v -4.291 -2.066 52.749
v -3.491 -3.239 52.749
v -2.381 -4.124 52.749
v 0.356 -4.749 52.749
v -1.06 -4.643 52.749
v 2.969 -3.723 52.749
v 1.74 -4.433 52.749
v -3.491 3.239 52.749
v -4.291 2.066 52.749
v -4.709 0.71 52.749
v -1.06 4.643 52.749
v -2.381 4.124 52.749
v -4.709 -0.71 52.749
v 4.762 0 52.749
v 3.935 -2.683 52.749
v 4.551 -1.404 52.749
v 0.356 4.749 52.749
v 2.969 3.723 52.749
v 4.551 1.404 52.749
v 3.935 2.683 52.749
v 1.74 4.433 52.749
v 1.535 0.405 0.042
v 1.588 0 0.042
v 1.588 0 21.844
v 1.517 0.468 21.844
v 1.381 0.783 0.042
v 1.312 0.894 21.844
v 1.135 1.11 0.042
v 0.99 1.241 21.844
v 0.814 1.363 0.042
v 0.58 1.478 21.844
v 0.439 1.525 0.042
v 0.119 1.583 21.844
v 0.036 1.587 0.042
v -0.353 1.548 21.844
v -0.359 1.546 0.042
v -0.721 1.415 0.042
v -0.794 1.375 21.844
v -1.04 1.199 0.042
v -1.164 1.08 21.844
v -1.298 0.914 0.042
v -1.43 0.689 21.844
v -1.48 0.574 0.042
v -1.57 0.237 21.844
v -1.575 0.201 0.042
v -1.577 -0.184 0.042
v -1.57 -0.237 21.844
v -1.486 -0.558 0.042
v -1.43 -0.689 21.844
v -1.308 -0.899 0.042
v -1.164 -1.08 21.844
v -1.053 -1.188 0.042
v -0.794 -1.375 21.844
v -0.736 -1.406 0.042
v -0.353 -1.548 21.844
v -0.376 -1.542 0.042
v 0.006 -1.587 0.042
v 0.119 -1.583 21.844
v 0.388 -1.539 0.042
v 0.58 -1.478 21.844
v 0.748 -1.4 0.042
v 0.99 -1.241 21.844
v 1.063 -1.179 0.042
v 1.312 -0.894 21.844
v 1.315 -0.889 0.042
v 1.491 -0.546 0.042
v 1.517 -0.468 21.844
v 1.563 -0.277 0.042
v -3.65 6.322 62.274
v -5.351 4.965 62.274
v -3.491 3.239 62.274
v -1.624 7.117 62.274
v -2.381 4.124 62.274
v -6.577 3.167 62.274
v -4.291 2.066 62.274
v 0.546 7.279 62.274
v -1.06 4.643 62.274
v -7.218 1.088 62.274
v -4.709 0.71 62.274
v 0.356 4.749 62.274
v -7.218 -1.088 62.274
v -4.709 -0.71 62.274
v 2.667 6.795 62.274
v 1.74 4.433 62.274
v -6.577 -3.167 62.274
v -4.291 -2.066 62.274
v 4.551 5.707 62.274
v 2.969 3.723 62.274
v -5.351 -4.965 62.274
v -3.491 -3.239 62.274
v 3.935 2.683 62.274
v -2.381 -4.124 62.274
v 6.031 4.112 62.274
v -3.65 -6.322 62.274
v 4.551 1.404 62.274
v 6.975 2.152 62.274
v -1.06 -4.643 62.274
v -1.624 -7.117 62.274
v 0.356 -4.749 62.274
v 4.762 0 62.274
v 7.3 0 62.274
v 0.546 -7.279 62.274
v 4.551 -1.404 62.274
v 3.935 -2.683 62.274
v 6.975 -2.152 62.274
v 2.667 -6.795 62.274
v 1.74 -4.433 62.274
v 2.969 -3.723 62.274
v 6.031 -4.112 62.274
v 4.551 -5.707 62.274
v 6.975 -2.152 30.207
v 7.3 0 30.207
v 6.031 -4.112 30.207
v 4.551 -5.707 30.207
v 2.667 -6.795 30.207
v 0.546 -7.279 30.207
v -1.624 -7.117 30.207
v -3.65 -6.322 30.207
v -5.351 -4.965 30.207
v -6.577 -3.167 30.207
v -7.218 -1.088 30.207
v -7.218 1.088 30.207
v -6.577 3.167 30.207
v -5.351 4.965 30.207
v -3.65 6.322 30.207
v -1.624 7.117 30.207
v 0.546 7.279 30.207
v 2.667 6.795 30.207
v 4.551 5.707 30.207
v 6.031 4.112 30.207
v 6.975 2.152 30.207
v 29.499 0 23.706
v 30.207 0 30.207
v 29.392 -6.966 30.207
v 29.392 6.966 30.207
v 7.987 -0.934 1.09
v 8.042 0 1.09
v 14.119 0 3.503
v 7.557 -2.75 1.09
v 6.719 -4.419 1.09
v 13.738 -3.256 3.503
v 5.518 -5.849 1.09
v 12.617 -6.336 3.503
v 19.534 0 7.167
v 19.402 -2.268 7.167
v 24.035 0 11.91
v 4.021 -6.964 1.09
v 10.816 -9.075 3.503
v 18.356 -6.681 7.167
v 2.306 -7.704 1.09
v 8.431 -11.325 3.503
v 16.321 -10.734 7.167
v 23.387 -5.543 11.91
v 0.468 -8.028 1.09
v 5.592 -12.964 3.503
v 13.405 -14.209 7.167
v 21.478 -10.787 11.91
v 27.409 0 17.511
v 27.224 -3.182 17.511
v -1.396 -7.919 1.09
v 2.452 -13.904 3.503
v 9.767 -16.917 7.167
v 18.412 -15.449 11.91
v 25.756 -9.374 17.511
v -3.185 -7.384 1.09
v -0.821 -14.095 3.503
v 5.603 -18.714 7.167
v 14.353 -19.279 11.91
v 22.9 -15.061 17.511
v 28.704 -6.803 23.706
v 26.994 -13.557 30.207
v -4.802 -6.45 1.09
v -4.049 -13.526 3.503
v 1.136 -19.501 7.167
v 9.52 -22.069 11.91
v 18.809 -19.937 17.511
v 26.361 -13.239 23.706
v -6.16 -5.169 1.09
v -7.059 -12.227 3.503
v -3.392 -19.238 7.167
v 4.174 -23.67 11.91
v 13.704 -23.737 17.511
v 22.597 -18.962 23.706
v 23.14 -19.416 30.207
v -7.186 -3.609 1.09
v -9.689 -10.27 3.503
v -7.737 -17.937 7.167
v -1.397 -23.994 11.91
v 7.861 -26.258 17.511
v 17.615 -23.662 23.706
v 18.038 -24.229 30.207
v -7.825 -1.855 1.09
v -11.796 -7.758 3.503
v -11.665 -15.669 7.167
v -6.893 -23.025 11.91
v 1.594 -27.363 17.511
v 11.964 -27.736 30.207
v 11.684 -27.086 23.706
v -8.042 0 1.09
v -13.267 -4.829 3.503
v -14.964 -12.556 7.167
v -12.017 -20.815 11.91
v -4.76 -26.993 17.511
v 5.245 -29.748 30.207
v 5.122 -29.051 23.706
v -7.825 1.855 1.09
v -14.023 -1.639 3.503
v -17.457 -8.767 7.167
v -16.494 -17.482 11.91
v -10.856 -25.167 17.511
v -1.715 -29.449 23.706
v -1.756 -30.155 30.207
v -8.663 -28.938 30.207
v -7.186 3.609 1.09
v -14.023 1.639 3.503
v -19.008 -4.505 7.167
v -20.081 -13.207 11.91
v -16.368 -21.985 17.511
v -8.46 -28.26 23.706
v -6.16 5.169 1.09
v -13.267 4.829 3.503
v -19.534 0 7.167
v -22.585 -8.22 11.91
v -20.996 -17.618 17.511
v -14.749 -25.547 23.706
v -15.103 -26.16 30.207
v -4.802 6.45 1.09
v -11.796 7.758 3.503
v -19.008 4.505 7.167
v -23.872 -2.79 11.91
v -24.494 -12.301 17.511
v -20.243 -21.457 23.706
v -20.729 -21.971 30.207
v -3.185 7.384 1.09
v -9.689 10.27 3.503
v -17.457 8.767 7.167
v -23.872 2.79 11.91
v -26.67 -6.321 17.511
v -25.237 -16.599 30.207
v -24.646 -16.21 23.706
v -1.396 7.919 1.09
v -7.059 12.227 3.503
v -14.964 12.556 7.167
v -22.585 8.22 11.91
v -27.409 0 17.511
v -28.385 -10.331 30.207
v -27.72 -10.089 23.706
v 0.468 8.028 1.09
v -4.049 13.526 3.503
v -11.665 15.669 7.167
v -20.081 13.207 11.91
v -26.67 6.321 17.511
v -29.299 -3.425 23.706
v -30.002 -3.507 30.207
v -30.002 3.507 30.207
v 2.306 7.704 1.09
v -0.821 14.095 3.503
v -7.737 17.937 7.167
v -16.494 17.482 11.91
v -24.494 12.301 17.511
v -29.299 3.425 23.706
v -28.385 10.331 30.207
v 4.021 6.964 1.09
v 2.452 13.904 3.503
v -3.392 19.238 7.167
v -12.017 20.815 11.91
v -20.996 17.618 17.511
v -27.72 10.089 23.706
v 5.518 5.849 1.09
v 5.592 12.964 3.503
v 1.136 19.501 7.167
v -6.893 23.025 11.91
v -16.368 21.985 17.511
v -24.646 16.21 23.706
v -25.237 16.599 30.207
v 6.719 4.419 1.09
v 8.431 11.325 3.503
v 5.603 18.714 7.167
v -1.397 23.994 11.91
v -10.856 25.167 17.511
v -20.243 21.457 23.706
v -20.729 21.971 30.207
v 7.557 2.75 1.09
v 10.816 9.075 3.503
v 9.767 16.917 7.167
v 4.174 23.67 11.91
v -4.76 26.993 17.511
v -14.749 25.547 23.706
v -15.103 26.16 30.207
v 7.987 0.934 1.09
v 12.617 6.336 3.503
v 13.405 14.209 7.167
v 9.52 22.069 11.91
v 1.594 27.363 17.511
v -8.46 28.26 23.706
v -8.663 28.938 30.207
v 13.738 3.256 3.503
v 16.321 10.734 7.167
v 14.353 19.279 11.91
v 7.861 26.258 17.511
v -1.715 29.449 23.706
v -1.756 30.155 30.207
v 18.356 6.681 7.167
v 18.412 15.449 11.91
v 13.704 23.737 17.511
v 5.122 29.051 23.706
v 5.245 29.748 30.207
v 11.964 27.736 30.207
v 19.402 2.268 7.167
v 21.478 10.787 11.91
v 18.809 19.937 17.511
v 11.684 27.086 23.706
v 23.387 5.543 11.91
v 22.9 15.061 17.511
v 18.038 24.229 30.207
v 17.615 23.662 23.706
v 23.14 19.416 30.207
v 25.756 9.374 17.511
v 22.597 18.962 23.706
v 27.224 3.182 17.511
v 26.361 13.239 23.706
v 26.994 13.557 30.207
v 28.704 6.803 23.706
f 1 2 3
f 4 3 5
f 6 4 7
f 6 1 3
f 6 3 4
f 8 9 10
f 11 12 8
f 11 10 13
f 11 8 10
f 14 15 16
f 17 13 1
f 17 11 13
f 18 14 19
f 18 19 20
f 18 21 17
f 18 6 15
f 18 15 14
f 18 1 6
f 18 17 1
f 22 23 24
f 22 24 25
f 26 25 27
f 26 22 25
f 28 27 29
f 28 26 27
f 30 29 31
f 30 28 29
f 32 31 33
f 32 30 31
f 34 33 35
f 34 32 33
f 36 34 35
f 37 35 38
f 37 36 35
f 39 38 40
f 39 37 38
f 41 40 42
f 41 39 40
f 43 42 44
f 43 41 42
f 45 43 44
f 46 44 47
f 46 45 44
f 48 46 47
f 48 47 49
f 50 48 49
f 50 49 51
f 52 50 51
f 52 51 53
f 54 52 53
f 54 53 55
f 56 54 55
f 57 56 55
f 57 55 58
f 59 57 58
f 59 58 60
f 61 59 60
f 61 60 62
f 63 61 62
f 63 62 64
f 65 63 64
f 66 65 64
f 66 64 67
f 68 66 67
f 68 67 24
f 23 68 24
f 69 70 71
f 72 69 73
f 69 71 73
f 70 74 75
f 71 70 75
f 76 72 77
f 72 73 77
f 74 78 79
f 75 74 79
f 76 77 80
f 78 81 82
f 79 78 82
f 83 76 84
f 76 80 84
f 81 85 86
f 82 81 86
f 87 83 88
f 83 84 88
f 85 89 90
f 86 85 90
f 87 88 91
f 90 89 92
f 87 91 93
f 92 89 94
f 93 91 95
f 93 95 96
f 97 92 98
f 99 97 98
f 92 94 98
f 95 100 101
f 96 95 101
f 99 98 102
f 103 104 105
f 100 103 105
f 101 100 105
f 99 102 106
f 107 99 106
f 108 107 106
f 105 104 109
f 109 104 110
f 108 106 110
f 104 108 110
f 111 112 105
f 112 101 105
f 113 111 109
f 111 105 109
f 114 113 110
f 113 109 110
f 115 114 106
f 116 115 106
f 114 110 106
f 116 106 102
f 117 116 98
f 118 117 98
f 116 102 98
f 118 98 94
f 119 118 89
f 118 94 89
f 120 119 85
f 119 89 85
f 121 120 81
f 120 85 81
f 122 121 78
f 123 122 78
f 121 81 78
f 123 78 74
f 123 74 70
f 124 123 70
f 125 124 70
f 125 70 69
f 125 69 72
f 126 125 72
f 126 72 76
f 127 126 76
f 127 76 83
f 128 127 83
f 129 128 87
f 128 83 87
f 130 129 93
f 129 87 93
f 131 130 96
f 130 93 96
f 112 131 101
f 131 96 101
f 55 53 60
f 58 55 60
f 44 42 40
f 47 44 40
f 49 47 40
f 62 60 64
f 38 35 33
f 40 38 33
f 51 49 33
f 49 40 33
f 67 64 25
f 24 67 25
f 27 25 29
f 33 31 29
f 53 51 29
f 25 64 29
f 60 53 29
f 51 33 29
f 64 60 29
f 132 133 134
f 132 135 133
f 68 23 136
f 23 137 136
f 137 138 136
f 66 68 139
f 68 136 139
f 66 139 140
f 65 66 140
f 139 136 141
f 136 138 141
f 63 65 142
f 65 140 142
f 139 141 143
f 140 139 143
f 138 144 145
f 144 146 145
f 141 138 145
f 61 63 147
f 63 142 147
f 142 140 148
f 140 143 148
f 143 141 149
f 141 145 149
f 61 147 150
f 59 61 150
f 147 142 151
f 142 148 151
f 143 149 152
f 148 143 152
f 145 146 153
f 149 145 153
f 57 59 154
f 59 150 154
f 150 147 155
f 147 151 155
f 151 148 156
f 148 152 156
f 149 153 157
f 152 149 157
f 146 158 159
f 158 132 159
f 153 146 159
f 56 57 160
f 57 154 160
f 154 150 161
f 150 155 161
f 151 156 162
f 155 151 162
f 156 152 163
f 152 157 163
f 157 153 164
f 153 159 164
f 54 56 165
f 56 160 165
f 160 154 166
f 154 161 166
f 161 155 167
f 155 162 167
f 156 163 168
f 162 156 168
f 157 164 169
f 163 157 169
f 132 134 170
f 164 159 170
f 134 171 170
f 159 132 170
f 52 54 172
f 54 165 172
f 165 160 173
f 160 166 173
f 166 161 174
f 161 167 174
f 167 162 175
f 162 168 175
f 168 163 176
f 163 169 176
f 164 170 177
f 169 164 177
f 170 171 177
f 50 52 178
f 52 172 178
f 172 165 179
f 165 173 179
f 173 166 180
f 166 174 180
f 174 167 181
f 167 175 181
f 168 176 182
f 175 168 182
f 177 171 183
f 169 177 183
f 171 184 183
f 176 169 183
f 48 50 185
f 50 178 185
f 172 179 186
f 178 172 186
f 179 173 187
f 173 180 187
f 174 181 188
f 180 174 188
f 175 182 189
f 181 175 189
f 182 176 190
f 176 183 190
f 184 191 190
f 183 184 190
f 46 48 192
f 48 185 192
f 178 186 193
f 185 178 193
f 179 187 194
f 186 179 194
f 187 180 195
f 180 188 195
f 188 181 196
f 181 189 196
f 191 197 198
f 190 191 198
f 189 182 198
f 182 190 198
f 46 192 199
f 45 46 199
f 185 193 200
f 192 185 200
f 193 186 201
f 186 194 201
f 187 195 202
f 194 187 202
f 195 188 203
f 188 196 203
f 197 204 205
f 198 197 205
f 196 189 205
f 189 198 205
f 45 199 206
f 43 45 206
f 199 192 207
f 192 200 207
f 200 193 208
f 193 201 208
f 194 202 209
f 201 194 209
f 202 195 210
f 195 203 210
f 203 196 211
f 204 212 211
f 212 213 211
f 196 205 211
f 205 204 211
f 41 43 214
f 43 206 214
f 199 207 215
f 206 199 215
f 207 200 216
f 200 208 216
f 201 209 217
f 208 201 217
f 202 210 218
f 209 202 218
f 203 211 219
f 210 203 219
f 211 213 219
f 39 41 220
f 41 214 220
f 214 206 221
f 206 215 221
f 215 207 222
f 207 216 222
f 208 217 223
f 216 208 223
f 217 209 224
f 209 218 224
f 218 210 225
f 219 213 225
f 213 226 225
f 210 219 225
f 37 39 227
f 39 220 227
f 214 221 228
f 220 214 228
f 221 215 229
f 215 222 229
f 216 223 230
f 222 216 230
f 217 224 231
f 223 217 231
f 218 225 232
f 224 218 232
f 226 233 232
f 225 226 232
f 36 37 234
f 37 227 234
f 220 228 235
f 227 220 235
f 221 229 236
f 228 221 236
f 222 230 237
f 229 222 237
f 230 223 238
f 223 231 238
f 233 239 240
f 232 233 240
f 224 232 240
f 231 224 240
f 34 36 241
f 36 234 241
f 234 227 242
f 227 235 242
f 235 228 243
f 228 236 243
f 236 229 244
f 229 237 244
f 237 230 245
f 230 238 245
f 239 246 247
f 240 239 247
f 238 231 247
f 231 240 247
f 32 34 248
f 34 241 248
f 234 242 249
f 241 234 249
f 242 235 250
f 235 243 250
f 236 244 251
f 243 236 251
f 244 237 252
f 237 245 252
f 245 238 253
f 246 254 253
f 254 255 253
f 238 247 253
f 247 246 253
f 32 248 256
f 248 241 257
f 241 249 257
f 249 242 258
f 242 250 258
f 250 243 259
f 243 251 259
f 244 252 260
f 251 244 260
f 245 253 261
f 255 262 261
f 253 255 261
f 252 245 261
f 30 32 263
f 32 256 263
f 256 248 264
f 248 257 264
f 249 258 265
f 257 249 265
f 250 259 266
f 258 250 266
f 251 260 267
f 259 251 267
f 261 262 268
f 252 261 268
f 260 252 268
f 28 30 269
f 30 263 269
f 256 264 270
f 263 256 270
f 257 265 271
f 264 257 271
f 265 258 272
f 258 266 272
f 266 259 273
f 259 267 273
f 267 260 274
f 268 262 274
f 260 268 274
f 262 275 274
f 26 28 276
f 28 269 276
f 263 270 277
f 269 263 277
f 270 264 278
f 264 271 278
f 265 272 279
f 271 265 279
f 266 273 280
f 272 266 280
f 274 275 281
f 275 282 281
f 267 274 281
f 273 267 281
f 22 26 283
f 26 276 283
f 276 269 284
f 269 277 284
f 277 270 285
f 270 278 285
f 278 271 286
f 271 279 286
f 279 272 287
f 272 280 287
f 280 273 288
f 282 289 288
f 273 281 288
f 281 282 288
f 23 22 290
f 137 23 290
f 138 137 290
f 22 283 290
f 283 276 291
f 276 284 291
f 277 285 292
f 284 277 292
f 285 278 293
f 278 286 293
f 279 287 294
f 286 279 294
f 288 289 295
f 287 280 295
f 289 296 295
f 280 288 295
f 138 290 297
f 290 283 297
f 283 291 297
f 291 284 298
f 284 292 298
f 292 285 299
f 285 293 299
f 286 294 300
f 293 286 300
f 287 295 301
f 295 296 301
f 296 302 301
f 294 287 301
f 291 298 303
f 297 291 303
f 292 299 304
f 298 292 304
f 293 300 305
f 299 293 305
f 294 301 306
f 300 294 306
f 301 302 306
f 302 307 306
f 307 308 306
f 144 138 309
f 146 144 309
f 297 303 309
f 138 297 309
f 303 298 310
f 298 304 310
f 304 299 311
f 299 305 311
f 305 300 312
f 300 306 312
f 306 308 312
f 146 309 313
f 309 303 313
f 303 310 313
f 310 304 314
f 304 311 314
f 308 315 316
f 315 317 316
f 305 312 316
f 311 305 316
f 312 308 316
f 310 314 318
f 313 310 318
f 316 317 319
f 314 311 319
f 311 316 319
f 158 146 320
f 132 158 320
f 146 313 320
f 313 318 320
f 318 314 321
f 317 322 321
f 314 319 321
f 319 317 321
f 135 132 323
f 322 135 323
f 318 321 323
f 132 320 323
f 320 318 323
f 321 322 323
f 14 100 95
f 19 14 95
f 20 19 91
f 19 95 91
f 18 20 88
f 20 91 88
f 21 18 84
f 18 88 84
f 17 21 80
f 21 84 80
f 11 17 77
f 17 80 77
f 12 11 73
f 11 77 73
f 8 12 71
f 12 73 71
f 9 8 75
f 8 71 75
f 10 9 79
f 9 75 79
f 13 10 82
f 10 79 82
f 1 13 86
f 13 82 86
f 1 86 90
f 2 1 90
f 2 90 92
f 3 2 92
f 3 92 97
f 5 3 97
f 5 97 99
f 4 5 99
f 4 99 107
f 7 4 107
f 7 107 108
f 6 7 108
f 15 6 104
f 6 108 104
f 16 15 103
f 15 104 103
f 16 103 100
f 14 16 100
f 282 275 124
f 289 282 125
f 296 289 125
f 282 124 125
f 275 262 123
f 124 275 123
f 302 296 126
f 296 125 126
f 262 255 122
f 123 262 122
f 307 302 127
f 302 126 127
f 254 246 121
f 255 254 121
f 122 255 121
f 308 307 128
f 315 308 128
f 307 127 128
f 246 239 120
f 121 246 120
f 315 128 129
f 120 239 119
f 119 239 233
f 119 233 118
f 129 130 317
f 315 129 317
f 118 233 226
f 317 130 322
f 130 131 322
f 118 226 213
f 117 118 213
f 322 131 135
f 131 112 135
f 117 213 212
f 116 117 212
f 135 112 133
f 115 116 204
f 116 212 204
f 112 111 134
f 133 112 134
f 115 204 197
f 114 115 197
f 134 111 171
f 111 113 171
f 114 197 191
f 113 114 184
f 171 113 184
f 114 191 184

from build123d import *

# Parameters (mm, degrees)
F2_R     = 4.7625
F3_DEPTH = 9.525
F4_R     = 1.5875
F5_DEPTH = 21.844


with BuildPart() as f1:
    # F0 (on Front) → F1 (revolve)
    with BuildSketch(Plane.XZ):
        with BuildLine():
            Line((0, 62.27351), (0, 0))
            ThreePointArc((0, 0), (21.359254, 8.847293), (30.206546, 30.206546))
            Line((30.206546, 30.206546), (7.299625, 30.206546))
            Line((7.299625, 30.206546), (7.299625, 62.27351))
            Line((7.299625, 62.27351), (0, 62.27351))
        make_face()
    revolve(axis=Axis((0, 0, 31.136755), (0, 0, -1)))

    # F2 (on face) → F3 (cut)
    with BuildSketch(Plane.XY.offset(62.27351)):
        Circle(F2_R)
    extrude(amount=-F3_DEPTH, mode=Mode.SUBTRACT)

    # F4 (on Top) → F5 (cut)
    with BuildSketch(Plane.XY):
        Circle(F4_R)
    extrude(amount=F5_DEPTH, mode=Mode.SUBTRACT)


solid = f1.part
